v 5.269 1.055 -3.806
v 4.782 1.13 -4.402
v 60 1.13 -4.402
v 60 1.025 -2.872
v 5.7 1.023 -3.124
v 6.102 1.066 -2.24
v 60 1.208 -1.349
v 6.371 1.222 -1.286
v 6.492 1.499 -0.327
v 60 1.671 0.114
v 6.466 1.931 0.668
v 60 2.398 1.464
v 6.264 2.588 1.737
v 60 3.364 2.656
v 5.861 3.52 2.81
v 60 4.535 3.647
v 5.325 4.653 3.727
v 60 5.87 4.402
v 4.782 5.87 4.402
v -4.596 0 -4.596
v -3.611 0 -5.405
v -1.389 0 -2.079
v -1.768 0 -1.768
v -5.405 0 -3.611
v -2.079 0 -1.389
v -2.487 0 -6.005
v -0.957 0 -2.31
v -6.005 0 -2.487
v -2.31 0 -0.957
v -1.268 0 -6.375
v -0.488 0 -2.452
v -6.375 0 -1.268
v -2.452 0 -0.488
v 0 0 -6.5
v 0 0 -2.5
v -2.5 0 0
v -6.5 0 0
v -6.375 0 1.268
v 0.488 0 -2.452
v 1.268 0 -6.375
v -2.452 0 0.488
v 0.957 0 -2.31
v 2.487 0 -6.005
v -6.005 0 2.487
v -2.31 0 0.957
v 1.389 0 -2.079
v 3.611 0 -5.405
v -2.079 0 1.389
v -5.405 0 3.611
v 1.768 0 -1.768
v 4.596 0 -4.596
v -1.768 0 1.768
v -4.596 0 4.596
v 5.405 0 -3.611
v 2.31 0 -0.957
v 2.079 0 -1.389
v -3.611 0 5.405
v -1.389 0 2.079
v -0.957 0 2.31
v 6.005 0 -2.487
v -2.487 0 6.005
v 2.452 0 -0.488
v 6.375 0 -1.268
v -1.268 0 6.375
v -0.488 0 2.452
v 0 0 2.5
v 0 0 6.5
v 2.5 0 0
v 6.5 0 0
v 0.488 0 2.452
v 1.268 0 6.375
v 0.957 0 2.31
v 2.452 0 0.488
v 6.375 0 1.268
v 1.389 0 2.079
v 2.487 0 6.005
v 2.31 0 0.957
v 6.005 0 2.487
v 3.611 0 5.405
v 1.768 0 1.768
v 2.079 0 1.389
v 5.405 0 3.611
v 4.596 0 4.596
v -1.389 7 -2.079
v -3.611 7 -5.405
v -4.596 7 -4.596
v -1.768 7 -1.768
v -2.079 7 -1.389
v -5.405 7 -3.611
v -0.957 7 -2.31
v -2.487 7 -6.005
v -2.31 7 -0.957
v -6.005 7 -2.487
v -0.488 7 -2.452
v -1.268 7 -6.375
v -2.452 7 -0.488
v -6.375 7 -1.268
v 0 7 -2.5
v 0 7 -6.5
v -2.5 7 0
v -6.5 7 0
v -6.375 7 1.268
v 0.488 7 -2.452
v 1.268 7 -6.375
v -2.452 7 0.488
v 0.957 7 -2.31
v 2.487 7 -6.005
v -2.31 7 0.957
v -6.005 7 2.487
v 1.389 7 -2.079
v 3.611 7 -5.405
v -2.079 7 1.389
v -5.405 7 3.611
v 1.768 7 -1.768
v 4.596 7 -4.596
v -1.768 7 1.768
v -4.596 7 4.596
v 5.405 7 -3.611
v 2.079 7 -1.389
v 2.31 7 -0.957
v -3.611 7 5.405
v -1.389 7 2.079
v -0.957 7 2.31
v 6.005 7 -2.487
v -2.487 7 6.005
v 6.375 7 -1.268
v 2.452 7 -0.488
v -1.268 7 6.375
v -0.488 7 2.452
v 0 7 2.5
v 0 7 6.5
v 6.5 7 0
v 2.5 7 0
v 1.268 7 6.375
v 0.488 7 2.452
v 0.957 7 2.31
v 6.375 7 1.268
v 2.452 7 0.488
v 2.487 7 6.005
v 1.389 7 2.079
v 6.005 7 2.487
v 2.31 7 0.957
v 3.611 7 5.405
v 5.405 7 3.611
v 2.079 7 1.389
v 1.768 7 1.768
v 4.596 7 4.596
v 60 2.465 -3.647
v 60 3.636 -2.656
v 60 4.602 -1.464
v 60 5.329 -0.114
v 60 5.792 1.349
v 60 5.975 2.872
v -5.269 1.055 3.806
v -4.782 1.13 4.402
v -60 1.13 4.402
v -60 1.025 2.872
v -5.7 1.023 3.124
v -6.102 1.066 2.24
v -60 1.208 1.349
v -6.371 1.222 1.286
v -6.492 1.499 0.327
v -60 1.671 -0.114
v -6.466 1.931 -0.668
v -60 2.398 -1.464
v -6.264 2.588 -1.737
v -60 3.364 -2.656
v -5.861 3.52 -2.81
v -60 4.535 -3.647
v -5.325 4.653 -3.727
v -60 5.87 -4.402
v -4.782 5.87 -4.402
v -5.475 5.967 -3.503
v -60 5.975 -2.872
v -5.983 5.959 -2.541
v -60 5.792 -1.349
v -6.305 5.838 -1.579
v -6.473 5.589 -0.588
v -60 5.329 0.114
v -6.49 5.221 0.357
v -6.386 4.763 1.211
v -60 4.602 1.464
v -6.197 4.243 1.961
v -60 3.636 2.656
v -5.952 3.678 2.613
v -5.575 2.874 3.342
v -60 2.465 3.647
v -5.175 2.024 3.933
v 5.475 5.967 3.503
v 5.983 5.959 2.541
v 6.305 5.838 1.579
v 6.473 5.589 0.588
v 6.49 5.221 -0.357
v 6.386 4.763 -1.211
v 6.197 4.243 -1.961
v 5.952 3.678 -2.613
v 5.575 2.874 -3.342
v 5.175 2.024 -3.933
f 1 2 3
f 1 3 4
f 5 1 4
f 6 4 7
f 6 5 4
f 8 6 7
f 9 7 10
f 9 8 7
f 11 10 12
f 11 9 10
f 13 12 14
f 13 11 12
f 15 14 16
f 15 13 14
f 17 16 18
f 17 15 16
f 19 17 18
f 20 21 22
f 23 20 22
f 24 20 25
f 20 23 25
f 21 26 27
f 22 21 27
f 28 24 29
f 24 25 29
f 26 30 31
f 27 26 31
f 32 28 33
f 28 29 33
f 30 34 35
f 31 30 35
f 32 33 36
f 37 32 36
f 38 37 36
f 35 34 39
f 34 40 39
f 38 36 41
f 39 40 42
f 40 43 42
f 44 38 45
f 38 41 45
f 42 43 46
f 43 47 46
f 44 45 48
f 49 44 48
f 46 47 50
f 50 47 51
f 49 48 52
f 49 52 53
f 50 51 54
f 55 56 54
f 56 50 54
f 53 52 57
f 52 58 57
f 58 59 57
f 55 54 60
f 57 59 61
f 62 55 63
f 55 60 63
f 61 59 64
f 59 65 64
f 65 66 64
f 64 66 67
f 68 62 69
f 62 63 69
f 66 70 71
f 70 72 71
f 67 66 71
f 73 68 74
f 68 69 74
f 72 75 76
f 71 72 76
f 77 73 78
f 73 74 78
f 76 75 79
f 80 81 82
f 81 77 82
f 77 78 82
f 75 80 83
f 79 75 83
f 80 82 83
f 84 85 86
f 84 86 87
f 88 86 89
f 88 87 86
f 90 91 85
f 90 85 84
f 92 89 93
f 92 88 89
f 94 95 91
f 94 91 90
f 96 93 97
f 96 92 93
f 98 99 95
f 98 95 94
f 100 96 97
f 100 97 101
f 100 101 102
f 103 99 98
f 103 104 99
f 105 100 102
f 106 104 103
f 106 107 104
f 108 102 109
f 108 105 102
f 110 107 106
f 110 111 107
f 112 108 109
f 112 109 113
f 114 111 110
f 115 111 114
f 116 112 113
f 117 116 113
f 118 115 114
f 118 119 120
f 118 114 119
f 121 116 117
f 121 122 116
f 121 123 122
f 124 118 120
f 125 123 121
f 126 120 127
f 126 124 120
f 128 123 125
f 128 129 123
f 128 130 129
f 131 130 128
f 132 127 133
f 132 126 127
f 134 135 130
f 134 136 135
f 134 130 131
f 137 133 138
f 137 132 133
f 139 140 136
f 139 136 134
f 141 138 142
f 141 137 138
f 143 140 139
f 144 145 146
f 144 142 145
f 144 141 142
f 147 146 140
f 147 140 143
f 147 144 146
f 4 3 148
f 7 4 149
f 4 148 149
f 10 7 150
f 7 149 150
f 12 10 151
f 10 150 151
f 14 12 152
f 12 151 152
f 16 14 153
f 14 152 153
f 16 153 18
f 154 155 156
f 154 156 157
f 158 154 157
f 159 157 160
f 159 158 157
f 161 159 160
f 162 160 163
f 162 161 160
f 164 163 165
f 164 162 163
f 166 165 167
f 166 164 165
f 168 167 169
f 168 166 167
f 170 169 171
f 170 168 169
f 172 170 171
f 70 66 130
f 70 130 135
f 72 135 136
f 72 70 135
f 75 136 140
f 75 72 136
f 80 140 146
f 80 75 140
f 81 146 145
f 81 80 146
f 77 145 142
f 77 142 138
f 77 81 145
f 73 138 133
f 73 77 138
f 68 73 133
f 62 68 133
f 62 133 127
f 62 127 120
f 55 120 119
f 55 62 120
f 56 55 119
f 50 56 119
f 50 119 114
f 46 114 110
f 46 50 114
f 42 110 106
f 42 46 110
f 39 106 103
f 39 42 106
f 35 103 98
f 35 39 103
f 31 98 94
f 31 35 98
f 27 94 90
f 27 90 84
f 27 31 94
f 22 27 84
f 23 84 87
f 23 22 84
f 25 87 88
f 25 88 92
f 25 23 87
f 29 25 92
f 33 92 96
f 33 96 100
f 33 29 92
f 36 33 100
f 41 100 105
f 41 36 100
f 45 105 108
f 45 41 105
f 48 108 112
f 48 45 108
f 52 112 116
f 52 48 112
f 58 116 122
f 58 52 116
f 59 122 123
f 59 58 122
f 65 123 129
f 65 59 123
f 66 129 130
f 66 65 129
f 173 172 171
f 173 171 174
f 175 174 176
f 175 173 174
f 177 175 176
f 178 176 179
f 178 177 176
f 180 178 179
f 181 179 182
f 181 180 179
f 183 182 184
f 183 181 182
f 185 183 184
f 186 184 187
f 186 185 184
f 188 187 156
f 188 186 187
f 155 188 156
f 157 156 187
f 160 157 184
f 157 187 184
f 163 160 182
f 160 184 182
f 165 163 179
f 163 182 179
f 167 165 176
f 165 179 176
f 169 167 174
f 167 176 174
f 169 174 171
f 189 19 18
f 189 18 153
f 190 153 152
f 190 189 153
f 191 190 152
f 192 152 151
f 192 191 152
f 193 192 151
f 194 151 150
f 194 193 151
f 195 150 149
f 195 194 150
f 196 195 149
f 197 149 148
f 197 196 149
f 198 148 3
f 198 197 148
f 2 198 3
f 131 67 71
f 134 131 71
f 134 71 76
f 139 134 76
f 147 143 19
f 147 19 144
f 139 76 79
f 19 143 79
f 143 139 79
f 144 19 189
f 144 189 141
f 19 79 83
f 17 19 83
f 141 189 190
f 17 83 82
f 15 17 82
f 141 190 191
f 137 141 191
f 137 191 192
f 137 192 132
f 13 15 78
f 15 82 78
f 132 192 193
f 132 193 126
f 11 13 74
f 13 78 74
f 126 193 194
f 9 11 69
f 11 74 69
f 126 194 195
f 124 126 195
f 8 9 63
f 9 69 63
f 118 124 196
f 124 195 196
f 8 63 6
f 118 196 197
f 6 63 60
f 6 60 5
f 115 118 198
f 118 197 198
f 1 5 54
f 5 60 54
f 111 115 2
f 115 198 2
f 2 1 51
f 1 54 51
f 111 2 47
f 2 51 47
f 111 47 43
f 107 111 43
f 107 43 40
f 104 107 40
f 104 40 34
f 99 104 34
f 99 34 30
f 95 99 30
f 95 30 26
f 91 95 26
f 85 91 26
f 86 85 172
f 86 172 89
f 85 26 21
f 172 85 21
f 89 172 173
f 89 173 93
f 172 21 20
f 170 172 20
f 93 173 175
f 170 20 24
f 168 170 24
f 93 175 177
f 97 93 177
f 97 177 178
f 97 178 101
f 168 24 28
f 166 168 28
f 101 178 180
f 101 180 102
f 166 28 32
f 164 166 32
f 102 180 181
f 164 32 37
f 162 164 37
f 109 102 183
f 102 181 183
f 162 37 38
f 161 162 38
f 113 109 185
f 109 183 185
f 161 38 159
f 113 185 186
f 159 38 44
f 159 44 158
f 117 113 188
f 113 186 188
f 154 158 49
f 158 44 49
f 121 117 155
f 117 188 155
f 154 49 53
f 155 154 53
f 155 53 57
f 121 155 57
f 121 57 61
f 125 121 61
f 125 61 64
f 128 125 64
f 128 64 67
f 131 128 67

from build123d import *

# Parameters (mm, degrees)
SKETCH1_R           = 6.5
SKETCH1_R_2         = 2.5
BOSS_EXTRUDE1_DEPTH = 7
BOSS_EXTRUDE2_START = 4
BOSS_EXTRUDE2_DEPTH = 56
CIRPATTERN1_COUNT   = 2


with BuildPart() as part:
    # Sketch1 → Boss-Extrude1 (new body)
    with BuildSketch(Plane(origin=(0, 0, 0), x_dir=(1, 0, 0), z_dir=(0, 1, 0))):
        with Locations(Location((0, 0, 0), (0, 0, 270))):
            Circle(SKETCH1_R)
        with Locations(Location((0, 0, 0), (0, 0, 270))):
            Circle(SKETCH1_R_2, mode=Mode.SUBTRACT)
    extrude(amount=BOSS_EXTRUDE1_DEPTH)

    # Sketch2 → Boss-Extrude2 (add)
    with BuildSketch(Plane(origin=(0, 0, 0), x_dir=(0, 0, -1), z_dir=(1, 0, 0)).offset(BOSS_EXTRUDE2_START)):
        with BuildLine():
            ThreePointArc((-4.4023555, 5.870499115), (0.805969699, 4.99680087), (4.4023555, 1.129500885))
            Line((4.4023555, 1.129500885), (-4.4023555, 5.870499115))
        make_face()
        with BuildLine():
            Line((-4.4023555, 5.870499115), (4.4023555, 1.129500885))
            ThreePointArc((4.4023555, 1.129500885), (-0.805969699, 2.00319913), (-4.4023555, 5.870499115))
        make_face()
    boss_extrude2 = extrude(amount=BOSS_EXTRUDE2_DEPTH)

    # CirPattern1: Boss-Extrude2 ×2 about axis
    cirpattern1_axis = Axis((0, 7.76683161, 0), (0, -1, 0))
    for i in range(1, CIRPATTERN1_COUNT):
        add(boss_extrude2.rotate(cirpattern1_axis, i * 360 / CIRPATTERN1_COUNT))


solid = part.part
